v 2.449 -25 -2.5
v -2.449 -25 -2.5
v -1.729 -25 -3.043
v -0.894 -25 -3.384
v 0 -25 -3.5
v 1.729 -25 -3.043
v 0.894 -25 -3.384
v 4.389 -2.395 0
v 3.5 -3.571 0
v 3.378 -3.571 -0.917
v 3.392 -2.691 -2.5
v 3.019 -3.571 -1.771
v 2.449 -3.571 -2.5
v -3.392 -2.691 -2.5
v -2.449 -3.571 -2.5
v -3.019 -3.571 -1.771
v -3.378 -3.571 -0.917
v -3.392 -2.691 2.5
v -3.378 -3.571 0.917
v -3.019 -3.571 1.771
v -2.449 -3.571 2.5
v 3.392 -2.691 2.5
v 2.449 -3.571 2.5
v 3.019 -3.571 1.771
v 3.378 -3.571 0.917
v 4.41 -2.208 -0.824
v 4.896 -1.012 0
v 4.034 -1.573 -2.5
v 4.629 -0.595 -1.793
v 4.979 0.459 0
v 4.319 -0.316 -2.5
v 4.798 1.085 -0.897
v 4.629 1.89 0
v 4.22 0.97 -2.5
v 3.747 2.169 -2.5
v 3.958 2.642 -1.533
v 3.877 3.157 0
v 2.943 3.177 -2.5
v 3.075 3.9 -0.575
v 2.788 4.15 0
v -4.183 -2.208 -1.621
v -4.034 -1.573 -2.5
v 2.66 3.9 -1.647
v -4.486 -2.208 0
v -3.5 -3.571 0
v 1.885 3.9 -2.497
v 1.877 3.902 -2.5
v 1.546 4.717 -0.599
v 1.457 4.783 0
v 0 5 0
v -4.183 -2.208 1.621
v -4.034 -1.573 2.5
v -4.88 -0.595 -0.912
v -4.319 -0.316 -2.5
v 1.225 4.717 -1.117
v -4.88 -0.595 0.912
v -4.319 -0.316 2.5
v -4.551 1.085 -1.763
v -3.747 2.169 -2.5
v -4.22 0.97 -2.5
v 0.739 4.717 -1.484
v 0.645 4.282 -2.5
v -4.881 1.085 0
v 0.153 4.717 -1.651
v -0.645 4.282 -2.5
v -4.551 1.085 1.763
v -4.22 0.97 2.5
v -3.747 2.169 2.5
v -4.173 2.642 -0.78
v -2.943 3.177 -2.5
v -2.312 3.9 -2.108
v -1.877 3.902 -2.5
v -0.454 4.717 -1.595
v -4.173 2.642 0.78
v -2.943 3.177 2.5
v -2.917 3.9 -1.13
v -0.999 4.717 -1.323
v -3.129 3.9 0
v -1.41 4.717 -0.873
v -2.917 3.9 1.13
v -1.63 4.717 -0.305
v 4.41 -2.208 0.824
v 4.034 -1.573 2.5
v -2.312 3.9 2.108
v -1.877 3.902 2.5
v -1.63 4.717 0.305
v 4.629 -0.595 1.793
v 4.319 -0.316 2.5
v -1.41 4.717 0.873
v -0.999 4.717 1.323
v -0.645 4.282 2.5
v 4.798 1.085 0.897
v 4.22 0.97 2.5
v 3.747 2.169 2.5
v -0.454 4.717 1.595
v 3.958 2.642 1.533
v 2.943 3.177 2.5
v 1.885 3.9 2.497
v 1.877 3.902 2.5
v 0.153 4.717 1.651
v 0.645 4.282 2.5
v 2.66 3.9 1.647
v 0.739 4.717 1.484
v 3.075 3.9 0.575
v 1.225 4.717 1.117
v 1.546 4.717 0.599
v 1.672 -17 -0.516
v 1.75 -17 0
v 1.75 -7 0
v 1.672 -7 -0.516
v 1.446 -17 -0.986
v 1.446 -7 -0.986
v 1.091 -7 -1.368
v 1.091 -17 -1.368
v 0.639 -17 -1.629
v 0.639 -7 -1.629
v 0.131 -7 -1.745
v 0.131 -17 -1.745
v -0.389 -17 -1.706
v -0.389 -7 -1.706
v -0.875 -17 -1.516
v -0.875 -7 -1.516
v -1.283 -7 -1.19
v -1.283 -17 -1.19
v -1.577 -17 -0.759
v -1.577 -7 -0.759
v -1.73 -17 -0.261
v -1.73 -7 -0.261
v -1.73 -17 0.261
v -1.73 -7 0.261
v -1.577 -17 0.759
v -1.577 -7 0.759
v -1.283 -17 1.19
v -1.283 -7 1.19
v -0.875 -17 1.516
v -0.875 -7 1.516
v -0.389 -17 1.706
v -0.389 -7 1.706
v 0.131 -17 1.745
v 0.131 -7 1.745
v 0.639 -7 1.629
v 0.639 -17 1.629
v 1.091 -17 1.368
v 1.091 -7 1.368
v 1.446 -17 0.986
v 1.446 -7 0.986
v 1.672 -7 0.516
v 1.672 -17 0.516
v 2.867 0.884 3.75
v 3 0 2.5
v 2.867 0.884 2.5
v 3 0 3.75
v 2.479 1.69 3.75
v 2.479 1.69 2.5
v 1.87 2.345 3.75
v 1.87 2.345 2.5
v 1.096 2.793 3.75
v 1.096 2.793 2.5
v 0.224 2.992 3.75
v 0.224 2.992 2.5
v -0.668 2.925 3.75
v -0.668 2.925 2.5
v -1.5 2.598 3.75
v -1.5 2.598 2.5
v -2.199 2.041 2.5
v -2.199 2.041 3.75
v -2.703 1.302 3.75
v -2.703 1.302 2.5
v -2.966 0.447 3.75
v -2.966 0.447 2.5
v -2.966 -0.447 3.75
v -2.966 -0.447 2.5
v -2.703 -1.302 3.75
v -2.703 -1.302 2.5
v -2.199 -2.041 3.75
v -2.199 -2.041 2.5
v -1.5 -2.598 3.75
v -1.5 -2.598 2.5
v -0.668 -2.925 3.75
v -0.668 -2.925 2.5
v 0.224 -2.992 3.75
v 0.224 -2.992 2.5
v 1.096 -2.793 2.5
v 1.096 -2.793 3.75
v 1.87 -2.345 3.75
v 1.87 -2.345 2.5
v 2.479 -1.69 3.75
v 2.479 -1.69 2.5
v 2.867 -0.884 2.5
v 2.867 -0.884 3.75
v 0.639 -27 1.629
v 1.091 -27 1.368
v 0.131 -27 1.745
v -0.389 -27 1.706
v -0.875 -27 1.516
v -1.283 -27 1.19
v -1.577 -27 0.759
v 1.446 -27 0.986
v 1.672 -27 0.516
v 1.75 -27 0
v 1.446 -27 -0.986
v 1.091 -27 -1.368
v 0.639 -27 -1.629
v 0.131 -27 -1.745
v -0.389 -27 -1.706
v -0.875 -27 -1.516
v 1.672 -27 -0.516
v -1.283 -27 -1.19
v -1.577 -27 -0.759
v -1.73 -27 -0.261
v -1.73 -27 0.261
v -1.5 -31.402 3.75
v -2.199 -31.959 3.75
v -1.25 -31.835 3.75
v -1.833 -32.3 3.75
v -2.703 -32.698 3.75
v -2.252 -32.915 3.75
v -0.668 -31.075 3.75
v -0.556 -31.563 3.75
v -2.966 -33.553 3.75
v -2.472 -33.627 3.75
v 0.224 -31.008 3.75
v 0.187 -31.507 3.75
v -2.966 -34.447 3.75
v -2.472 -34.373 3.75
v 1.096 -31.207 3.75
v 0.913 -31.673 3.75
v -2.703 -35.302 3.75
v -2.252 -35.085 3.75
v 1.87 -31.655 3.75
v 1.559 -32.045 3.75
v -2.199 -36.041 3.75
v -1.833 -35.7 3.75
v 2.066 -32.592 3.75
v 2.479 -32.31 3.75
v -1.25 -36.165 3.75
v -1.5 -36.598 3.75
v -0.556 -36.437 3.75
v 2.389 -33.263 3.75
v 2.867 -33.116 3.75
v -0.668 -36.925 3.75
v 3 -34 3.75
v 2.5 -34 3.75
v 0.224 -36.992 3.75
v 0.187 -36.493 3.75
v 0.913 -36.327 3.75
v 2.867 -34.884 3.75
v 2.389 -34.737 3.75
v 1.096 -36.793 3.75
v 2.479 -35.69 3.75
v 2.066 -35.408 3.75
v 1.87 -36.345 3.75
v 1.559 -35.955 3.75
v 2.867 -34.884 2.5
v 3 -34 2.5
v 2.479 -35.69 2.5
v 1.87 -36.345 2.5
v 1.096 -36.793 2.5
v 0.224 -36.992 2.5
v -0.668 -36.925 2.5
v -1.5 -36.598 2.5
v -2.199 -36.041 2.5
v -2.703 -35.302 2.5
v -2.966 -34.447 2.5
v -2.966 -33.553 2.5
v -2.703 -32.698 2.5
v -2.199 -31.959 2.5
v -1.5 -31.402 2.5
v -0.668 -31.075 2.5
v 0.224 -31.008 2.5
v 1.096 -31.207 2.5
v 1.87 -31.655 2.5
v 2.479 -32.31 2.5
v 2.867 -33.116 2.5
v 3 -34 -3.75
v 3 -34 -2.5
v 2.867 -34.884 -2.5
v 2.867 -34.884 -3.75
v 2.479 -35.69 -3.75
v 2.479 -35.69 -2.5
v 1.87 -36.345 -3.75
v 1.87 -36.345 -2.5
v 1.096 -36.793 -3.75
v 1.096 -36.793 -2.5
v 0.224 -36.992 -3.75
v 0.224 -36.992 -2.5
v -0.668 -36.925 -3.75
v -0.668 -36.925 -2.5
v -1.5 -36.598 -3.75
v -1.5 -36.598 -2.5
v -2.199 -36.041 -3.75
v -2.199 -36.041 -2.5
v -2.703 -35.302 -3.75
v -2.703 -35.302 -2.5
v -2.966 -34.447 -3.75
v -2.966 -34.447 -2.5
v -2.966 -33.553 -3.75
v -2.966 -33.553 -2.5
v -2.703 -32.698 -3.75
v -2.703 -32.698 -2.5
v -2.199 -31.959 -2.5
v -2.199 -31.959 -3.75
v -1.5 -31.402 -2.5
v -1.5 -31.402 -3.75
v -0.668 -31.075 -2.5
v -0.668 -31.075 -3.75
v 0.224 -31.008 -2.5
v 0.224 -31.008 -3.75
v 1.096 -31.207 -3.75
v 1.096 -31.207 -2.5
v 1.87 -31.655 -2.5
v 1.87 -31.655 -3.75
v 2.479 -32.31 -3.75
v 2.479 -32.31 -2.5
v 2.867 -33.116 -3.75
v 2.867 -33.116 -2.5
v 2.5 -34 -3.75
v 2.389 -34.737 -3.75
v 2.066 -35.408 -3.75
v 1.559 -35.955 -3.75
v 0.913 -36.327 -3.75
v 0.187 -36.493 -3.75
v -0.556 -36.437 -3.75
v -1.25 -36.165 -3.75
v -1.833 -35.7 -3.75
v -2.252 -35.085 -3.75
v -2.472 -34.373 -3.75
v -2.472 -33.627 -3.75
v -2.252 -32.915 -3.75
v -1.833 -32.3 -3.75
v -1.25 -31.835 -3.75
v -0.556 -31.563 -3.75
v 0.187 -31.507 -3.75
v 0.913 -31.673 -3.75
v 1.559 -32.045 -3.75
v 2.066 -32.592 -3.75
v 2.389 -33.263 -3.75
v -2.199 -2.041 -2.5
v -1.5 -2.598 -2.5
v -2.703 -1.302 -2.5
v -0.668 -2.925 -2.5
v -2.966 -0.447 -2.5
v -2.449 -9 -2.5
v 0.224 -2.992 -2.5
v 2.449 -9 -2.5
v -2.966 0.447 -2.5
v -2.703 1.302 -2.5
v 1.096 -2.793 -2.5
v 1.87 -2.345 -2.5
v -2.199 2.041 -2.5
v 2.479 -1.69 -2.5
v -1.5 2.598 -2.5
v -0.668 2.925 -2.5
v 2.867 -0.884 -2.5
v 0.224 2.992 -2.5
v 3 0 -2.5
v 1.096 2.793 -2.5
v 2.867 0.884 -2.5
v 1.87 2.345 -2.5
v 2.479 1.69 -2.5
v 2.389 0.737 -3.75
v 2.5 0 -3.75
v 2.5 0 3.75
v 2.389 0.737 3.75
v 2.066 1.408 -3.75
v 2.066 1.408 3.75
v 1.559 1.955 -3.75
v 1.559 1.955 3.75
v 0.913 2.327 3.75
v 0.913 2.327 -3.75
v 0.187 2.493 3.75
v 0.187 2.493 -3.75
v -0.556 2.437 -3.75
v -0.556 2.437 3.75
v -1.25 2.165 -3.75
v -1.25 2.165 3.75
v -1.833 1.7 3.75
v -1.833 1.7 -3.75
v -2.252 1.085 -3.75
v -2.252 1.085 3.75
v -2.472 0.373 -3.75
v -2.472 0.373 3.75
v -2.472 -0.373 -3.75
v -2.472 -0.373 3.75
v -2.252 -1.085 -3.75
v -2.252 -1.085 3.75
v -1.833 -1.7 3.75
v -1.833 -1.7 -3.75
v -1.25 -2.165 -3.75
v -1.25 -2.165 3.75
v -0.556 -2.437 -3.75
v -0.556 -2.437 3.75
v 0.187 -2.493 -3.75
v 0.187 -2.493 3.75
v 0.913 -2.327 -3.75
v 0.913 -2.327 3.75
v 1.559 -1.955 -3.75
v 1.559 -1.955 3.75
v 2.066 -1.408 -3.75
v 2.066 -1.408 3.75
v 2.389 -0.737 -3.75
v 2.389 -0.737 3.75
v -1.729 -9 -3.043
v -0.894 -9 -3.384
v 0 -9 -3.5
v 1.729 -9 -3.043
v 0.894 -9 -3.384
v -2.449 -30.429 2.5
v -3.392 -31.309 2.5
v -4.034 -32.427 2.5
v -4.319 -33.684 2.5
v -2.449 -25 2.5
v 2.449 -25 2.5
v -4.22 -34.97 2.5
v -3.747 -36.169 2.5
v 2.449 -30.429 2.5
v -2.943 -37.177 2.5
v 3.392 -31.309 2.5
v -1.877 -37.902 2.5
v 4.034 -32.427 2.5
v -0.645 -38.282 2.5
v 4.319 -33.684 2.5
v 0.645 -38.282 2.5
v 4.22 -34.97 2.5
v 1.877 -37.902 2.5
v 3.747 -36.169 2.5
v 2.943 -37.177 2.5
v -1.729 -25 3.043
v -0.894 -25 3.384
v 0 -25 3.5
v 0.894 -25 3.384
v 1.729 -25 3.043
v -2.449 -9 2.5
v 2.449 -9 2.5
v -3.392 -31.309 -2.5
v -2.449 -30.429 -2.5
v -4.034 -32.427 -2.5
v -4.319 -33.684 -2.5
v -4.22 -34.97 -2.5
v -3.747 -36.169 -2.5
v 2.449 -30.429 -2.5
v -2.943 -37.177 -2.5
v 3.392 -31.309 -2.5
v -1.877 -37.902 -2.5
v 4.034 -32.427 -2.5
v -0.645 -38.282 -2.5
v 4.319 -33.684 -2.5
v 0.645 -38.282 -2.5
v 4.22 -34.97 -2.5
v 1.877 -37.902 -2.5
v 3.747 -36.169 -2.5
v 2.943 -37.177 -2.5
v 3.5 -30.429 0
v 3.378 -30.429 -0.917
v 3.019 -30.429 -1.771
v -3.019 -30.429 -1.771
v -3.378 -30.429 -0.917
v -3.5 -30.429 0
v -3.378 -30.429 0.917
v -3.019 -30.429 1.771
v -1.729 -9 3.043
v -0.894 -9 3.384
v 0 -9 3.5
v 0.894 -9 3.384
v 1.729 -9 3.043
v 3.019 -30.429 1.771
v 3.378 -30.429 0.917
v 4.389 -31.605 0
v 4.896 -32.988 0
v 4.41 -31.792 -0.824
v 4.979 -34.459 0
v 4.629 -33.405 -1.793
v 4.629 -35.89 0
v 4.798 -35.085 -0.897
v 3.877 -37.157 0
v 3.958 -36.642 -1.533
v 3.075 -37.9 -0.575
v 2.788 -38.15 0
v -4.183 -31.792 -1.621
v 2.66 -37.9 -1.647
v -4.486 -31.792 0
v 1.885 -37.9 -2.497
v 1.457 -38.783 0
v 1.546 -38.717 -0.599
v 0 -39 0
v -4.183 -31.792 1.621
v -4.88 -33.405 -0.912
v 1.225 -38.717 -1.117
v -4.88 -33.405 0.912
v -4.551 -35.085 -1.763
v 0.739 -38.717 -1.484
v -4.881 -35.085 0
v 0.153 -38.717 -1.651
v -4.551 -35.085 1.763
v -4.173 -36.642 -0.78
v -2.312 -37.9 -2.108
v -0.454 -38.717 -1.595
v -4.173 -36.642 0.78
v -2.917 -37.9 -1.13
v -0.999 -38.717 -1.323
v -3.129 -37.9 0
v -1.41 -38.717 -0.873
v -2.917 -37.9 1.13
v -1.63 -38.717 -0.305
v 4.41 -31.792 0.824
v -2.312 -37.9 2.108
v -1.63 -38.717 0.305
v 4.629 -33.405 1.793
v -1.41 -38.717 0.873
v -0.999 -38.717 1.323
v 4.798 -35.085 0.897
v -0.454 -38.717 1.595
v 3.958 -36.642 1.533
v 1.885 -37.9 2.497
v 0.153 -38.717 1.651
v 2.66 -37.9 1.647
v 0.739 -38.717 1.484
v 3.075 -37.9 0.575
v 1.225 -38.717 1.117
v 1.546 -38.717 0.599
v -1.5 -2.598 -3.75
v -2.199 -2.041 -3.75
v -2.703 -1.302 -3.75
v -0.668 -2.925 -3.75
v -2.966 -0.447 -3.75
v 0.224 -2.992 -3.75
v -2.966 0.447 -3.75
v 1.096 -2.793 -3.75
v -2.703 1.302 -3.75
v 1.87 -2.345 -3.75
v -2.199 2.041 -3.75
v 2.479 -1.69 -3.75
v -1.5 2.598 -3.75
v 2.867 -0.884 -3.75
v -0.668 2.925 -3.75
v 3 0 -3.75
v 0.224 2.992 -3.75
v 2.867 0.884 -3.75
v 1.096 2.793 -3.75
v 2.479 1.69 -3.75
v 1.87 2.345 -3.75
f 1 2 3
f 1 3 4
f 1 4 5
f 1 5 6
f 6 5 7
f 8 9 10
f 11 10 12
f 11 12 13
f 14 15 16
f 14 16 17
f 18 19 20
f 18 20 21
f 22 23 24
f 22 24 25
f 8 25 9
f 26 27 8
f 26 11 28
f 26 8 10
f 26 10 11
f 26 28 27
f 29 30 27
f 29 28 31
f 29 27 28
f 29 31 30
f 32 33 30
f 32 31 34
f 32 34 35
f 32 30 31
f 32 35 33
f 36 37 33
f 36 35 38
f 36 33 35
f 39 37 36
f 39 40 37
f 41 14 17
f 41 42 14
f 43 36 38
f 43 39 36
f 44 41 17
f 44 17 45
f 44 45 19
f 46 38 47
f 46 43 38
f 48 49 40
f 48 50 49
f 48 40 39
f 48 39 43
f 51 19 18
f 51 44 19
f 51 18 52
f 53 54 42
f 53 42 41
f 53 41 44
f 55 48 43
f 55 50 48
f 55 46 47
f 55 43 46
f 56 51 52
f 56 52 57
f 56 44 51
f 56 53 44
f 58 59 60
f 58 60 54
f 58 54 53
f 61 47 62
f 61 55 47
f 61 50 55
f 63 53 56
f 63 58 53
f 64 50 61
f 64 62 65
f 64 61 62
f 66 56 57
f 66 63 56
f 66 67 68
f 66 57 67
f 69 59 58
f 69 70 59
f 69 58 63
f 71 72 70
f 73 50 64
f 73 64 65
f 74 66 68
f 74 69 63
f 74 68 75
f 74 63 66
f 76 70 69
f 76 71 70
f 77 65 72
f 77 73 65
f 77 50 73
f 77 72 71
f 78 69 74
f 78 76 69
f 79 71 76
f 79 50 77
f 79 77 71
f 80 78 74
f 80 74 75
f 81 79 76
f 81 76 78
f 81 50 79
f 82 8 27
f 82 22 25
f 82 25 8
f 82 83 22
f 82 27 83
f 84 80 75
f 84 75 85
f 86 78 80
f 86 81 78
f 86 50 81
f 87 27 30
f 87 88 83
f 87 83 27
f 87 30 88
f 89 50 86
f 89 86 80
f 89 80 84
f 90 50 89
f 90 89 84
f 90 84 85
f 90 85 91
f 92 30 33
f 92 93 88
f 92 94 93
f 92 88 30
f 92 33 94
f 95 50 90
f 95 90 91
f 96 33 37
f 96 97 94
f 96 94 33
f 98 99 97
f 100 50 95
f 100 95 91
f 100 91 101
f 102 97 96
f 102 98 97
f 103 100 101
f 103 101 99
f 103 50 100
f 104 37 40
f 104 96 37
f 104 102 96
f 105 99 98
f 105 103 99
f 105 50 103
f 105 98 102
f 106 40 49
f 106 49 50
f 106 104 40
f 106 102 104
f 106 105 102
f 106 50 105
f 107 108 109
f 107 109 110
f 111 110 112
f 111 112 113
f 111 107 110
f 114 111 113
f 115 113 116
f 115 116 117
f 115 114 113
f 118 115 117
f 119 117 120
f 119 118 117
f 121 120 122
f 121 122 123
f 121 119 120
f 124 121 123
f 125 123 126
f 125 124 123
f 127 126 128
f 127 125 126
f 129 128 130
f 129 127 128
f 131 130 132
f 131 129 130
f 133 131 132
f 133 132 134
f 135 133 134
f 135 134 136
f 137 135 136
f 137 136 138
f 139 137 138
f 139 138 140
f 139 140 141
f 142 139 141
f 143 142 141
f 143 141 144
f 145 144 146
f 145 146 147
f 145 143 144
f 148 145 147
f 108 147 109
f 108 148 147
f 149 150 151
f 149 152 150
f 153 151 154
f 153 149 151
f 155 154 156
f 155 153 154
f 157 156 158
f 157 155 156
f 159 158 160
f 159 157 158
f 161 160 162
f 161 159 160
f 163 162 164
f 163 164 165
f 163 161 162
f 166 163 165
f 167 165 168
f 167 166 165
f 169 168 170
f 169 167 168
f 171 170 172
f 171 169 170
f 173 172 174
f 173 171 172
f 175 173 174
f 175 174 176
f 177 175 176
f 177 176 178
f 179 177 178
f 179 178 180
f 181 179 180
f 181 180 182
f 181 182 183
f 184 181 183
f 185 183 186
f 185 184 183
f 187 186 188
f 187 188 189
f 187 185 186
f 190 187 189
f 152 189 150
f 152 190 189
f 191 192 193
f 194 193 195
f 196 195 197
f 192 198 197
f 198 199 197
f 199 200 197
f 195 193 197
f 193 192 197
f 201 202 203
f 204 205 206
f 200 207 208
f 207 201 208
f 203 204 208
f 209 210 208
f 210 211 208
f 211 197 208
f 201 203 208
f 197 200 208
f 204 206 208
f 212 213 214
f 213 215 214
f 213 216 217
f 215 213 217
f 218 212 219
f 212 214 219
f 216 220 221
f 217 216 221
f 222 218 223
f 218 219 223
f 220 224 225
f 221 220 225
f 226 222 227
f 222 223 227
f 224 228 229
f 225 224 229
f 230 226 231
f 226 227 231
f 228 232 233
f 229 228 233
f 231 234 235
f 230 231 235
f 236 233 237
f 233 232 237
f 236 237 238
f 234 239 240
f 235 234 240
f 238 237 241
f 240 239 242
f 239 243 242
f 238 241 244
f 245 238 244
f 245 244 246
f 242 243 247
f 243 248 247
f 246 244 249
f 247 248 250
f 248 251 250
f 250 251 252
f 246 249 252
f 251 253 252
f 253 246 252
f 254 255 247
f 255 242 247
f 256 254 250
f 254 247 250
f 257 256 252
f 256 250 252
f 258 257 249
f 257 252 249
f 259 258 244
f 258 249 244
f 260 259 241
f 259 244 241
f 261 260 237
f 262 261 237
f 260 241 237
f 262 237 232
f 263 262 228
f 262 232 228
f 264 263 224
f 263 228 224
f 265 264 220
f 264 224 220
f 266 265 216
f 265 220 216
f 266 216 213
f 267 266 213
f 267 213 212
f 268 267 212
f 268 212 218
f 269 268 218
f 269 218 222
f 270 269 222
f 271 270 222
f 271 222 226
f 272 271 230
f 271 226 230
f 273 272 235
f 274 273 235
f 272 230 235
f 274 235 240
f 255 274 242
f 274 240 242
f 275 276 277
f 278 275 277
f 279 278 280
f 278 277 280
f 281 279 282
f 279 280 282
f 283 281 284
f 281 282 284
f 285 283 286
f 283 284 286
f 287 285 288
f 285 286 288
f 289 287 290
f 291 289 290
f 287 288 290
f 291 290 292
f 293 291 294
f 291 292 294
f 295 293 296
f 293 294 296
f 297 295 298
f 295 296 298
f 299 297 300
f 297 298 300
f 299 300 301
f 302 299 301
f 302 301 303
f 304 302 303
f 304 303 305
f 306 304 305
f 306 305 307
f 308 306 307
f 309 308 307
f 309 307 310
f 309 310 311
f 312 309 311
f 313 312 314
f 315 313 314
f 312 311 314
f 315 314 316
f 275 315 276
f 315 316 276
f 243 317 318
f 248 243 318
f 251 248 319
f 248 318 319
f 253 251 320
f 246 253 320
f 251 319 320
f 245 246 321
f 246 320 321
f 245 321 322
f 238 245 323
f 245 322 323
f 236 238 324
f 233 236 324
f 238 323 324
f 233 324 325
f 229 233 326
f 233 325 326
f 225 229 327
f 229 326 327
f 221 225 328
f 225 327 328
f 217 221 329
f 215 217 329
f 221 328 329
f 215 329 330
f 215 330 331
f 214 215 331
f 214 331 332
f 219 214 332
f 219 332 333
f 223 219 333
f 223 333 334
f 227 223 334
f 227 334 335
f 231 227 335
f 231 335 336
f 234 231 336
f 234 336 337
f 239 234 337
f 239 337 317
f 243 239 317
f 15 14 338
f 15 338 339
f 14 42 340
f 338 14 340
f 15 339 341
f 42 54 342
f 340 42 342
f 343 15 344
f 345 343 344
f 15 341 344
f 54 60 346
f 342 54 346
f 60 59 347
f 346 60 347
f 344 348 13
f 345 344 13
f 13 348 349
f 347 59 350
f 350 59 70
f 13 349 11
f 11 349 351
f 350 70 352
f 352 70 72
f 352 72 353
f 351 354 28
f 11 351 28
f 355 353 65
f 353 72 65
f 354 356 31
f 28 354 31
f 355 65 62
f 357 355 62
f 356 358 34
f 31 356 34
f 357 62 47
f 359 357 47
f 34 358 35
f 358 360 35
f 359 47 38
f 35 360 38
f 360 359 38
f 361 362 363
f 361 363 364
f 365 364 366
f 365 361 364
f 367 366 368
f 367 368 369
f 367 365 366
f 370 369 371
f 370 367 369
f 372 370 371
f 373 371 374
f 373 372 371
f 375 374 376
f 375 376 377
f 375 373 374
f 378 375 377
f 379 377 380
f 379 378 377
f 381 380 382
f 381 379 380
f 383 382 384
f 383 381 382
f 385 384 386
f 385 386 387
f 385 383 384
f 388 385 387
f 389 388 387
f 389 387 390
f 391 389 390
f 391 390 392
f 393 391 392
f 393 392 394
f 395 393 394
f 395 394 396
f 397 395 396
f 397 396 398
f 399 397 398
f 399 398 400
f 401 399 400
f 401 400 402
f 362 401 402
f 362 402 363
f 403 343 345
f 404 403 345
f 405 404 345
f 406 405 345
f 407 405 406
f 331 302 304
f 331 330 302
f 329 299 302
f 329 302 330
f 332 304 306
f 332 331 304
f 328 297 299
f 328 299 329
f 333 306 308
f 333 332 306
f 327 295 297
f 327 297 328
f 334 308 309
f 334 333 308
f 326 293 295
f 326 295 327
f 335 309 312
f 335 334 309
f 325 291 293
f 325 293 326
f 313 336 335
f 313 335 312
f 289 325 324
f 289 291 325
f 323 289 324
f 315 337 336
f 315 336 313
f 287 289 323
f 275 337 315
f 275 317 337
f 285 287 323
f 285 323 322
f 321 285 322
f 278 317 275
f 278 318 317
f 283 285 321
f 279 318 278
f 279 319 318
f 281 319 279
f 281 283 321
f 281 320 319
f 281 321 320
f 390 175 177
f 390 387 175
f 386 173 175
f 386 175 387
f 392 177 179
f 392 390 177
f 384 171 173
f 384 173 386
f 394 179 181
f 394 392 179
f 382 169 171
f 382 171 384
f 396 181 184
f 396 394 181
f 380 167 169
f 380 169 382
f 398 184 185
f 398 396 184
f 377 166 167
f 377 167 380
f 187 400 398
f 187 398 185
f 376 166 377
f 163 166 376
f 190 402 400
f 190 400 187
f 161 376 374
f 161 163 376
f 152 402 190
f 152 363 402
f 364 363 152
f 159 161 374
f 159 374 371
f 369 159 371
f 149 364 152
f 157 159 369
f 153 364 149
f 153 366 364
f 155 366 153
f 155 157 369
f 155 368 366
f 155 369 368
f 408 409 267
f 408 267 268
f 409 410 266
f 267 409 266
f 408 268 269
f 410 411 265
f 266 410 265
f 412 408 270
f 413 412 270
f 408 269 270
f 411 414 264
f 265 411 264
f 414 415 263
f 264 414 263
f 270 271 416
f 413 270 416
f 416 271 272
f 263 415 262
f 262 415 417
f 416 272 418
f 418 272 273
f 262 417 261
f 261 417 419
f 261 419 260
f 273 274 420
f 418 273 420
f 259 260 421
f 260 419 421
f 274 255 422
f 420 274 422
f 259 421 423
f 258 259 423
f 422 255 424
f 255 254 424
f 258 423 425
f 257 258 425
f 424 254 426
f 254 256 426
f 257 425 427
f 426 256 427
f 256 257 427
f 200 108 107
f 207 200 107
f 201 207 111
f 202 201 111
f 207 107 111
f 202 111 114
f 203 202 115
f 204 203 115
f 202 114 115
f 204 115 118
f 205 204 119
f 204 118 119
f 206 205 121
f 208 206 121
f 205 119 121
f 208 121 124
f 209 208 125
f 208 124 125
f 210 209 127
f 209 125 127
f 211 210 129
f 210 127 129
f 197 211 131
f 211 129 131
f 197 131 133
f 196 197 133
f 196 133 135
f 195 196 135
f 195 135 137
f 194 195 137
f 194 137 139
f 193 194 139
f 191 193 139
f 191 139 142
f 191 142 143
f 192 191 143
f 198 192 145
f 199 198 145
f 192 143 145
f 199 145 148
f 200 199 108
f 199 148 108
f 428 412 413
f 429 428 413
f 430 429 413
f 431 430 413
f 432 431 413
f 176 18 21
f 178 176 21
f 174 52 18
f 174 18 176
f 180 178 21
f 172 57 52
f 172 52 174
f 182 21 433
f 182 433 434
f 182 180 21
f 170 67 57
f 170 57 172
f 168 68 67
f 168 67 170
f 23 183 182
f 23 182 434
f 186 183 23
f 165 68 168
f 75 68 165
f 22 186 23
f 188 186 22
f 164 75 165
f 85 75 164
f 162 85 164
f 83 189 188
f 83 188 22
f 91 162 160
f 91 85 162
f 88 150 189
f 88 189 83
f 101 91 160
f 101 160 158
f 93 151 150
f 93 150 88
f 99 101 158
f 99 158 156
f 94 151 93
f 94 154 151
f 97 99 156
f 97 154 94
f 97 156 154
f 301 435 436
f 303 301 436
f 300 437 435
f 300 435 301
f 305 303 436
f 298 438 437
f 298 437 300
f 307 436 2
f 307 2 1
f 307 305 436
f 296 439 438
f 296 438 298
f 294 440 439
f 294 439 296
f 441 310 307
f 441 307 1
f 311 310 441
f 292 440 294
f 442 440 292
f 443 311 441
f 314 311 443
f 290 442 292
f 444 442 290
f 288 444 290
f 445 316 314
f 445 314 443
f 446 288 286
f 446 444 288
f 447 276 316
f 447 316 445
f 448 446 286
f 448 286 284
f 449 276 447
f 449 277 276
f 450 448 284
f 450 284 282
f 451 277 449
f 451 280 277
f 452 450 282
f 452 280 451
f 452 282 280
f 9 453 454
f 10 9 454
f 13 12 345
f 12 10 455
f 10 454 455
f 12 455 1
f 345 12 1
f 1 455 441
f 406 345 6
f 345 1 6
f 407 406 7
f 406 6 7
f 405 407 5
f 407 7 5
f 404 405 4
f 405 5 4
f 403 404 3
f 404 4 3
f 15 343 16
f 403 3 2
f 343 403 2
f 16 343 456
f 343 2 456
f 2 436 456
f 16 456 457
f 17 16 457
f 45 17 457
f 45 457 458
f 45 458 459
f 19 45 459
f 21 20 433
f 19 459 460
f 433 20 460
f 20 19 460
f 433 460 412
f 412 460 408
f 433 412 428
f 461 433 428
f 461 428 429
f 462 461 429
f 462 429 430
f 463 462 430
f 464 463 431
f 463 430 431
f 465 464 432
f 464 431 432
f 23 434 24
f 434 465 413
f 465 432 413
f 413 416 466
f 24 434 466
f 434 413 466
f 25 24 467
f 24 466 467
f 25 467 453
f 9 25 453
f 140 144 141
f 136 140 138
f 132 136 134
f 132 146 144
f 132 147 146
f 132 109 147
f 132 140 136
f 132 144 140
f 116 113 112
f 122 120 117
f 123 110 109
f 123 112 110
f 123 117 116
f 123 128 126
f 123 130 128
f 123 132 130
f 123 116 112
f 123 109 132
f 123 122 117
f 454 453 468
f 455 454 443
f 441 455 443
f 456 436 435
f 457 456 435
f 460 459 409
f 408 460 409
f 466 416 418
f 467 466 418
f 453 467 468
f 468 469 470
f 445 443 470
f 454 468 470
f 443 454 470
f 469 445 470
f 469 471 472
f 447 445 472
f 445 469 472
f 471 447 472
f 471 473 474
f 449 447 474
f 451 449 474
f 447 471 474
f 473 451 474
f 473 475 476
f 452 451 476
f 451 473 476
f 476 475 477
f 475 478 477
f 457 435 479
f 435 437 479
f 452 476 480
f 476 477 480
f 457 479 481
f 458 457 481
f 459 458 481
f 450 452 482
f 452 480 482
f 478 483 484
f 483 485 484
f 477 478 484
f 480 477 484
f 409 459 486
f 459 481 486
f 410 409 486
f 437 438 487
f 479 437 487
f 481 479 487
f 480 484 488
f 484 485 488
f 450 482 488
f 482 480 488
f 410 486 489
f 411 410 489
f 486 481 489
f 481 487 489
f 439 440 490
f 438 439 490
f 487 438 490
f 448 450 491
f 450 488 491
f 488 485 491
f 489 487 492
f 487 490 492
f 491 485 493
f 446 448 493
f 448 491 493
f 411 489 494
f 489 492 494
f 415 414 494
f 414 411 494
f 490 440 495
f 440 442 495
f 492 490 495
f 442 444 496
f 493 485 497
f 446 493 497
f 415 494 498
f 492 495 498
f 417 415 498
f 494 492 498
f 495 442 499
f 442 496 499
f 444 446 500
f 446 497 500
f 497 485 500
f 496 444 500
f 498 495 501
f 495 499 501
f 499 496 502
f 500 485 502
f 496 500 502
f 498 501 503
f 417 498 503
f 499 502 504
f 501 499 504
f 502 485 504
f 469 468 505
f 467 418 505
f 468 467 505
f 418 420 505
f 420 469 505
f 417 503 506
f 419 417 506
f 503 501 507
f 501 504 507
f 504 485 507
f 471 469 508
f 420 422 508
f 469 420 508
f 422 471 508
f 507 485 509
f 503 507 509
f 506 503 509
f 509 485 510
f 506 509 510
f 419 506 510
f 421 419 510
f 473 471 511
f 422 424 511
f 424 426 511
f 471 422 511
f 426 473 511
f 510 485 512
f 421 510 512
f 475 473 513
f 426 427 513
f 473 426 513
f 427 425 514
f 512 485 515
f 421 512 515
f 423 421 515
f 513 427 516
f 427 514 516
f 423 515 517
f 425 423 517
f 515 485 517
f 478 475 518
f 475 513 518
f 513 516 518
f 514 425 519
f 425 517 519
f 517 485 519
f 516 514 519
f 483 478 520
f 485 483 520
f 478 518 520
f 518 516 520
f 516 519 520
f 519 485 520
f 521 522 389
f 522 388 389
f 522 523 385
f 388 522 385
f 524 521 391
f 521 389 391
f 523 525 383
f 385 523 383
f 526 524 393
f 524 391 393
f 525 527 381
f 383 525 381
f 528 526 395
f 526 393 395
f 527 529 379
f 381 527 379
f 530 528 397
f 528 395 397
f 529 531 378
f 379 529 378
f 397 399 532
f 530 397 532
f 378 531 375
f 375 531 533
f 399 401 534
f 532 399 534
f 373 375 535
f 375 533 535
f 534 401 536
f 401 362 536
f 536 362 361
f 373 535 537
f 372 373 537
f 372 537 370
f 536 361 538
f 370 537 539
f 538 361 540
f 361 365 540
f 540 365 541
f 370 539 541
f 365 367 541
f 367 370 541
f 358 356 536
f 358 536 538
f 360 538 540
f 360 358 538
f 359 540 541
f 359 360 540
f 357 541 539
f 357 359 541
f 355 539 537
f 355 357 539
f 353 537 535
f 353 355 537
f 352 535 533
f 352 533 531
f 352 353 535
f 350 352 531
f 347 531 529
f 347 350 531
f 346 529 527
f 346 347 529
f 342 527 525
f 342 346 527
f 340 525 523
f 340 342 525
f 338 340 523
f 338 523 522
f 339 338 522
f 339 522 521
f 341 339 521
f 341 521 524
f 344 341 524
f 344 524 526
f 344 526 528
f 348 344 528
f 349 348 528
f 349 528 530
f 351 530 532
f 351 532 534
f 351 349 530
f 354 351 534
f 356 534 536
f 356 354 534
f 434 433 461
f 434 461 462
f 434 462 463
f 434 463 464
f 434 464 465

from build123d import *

# Parameters (mm, degrees)
SKETCH2_R               = 2.5
CUT_EXTRUDE1_DEPTH      = 6
CUT_EXTRUDE1_DEPTH_BACK = 6
SKETCH4_W               = 12
SKETCH4_H               = 18
CUT_EXTRUDE2_DEPTH      = 1.830127
SKETCH3_R               = 3
SKETCH3_R_2             = 2.5
EXTRUDE_THIN1_DEPTH     = 3.75


with BuildPart() as part:
    # Sketch1 → Revolve1 (revolve)
    with BuildSketch(Plane.XY):
        with BuildLine():
            Line((0, 0), (0, -7))
            Line((0, -7), (1.75, -7))
            Line((1.75, -7), (1.75, -17))
            Line((1.75, -17), (3.5, -17))
            Line((3.5, -17), (3.5, -3.570714214))
            ThreePointArc((3.5, -3.570714214), (4.628907596, 1.890294809), (0, 5))
            Line((0, 5), (0, 0))
        make_face()
    revolve(axis=Axis((0, 0, 0), (0, 1, 0)))

    # Sketch2 → Cut-Extrude1 (cut, two sides)
    with BuildSketch(Plane.XY) as cut_extrude1_sk:
        Circle(SKETCH2_R)
    extrude(amount=CUT_EXTRUDE1_DEPTH, mode=Mode.SUBTRACT)
    extrude(cut_extrude1_sk.sketch, amount=-CUT_EXTRUDE1_DEPTH_BACK, mode=Mode.SUBTRACT)

    # Sketch4 → Cut-Extrude2 (cut)
    with BuildSketch(Plane.XY.offset(2.5)):
        Rectangle(SKETCH4_W, SKETCH4_H)
    cut_extrude2 = extrude(amount=CUT_EXTRUDE2_DEPTH, mode=Mode.SUBTRACT)

    # Mirror1: Cut-Extrude2 across plane
    add(cut_extrude2.mirror(Plane.XY), mode=Mode.SUBTRACT)

    # Sketch3 → Extrude-Thin1 (add, symmetric)
    with BuildSketch(Plane.XY):
        Circle(SKETCH3_R)
        Circle(SKETCH3_R_2, mode=Mode.SUBTRACT)
    extrude(amount=EXTRUDE_THIN1_DEPTH, both=True)

    # Mirror2: part across plane


with BuildPart() as part_1:
    add(part.part)
    add(part.part.mirror(Plane(origin=(1.75, -17, 0), x_dir=(0, 0, 1), z_dir=(0, -1, 0))))


solid = part_1.part
